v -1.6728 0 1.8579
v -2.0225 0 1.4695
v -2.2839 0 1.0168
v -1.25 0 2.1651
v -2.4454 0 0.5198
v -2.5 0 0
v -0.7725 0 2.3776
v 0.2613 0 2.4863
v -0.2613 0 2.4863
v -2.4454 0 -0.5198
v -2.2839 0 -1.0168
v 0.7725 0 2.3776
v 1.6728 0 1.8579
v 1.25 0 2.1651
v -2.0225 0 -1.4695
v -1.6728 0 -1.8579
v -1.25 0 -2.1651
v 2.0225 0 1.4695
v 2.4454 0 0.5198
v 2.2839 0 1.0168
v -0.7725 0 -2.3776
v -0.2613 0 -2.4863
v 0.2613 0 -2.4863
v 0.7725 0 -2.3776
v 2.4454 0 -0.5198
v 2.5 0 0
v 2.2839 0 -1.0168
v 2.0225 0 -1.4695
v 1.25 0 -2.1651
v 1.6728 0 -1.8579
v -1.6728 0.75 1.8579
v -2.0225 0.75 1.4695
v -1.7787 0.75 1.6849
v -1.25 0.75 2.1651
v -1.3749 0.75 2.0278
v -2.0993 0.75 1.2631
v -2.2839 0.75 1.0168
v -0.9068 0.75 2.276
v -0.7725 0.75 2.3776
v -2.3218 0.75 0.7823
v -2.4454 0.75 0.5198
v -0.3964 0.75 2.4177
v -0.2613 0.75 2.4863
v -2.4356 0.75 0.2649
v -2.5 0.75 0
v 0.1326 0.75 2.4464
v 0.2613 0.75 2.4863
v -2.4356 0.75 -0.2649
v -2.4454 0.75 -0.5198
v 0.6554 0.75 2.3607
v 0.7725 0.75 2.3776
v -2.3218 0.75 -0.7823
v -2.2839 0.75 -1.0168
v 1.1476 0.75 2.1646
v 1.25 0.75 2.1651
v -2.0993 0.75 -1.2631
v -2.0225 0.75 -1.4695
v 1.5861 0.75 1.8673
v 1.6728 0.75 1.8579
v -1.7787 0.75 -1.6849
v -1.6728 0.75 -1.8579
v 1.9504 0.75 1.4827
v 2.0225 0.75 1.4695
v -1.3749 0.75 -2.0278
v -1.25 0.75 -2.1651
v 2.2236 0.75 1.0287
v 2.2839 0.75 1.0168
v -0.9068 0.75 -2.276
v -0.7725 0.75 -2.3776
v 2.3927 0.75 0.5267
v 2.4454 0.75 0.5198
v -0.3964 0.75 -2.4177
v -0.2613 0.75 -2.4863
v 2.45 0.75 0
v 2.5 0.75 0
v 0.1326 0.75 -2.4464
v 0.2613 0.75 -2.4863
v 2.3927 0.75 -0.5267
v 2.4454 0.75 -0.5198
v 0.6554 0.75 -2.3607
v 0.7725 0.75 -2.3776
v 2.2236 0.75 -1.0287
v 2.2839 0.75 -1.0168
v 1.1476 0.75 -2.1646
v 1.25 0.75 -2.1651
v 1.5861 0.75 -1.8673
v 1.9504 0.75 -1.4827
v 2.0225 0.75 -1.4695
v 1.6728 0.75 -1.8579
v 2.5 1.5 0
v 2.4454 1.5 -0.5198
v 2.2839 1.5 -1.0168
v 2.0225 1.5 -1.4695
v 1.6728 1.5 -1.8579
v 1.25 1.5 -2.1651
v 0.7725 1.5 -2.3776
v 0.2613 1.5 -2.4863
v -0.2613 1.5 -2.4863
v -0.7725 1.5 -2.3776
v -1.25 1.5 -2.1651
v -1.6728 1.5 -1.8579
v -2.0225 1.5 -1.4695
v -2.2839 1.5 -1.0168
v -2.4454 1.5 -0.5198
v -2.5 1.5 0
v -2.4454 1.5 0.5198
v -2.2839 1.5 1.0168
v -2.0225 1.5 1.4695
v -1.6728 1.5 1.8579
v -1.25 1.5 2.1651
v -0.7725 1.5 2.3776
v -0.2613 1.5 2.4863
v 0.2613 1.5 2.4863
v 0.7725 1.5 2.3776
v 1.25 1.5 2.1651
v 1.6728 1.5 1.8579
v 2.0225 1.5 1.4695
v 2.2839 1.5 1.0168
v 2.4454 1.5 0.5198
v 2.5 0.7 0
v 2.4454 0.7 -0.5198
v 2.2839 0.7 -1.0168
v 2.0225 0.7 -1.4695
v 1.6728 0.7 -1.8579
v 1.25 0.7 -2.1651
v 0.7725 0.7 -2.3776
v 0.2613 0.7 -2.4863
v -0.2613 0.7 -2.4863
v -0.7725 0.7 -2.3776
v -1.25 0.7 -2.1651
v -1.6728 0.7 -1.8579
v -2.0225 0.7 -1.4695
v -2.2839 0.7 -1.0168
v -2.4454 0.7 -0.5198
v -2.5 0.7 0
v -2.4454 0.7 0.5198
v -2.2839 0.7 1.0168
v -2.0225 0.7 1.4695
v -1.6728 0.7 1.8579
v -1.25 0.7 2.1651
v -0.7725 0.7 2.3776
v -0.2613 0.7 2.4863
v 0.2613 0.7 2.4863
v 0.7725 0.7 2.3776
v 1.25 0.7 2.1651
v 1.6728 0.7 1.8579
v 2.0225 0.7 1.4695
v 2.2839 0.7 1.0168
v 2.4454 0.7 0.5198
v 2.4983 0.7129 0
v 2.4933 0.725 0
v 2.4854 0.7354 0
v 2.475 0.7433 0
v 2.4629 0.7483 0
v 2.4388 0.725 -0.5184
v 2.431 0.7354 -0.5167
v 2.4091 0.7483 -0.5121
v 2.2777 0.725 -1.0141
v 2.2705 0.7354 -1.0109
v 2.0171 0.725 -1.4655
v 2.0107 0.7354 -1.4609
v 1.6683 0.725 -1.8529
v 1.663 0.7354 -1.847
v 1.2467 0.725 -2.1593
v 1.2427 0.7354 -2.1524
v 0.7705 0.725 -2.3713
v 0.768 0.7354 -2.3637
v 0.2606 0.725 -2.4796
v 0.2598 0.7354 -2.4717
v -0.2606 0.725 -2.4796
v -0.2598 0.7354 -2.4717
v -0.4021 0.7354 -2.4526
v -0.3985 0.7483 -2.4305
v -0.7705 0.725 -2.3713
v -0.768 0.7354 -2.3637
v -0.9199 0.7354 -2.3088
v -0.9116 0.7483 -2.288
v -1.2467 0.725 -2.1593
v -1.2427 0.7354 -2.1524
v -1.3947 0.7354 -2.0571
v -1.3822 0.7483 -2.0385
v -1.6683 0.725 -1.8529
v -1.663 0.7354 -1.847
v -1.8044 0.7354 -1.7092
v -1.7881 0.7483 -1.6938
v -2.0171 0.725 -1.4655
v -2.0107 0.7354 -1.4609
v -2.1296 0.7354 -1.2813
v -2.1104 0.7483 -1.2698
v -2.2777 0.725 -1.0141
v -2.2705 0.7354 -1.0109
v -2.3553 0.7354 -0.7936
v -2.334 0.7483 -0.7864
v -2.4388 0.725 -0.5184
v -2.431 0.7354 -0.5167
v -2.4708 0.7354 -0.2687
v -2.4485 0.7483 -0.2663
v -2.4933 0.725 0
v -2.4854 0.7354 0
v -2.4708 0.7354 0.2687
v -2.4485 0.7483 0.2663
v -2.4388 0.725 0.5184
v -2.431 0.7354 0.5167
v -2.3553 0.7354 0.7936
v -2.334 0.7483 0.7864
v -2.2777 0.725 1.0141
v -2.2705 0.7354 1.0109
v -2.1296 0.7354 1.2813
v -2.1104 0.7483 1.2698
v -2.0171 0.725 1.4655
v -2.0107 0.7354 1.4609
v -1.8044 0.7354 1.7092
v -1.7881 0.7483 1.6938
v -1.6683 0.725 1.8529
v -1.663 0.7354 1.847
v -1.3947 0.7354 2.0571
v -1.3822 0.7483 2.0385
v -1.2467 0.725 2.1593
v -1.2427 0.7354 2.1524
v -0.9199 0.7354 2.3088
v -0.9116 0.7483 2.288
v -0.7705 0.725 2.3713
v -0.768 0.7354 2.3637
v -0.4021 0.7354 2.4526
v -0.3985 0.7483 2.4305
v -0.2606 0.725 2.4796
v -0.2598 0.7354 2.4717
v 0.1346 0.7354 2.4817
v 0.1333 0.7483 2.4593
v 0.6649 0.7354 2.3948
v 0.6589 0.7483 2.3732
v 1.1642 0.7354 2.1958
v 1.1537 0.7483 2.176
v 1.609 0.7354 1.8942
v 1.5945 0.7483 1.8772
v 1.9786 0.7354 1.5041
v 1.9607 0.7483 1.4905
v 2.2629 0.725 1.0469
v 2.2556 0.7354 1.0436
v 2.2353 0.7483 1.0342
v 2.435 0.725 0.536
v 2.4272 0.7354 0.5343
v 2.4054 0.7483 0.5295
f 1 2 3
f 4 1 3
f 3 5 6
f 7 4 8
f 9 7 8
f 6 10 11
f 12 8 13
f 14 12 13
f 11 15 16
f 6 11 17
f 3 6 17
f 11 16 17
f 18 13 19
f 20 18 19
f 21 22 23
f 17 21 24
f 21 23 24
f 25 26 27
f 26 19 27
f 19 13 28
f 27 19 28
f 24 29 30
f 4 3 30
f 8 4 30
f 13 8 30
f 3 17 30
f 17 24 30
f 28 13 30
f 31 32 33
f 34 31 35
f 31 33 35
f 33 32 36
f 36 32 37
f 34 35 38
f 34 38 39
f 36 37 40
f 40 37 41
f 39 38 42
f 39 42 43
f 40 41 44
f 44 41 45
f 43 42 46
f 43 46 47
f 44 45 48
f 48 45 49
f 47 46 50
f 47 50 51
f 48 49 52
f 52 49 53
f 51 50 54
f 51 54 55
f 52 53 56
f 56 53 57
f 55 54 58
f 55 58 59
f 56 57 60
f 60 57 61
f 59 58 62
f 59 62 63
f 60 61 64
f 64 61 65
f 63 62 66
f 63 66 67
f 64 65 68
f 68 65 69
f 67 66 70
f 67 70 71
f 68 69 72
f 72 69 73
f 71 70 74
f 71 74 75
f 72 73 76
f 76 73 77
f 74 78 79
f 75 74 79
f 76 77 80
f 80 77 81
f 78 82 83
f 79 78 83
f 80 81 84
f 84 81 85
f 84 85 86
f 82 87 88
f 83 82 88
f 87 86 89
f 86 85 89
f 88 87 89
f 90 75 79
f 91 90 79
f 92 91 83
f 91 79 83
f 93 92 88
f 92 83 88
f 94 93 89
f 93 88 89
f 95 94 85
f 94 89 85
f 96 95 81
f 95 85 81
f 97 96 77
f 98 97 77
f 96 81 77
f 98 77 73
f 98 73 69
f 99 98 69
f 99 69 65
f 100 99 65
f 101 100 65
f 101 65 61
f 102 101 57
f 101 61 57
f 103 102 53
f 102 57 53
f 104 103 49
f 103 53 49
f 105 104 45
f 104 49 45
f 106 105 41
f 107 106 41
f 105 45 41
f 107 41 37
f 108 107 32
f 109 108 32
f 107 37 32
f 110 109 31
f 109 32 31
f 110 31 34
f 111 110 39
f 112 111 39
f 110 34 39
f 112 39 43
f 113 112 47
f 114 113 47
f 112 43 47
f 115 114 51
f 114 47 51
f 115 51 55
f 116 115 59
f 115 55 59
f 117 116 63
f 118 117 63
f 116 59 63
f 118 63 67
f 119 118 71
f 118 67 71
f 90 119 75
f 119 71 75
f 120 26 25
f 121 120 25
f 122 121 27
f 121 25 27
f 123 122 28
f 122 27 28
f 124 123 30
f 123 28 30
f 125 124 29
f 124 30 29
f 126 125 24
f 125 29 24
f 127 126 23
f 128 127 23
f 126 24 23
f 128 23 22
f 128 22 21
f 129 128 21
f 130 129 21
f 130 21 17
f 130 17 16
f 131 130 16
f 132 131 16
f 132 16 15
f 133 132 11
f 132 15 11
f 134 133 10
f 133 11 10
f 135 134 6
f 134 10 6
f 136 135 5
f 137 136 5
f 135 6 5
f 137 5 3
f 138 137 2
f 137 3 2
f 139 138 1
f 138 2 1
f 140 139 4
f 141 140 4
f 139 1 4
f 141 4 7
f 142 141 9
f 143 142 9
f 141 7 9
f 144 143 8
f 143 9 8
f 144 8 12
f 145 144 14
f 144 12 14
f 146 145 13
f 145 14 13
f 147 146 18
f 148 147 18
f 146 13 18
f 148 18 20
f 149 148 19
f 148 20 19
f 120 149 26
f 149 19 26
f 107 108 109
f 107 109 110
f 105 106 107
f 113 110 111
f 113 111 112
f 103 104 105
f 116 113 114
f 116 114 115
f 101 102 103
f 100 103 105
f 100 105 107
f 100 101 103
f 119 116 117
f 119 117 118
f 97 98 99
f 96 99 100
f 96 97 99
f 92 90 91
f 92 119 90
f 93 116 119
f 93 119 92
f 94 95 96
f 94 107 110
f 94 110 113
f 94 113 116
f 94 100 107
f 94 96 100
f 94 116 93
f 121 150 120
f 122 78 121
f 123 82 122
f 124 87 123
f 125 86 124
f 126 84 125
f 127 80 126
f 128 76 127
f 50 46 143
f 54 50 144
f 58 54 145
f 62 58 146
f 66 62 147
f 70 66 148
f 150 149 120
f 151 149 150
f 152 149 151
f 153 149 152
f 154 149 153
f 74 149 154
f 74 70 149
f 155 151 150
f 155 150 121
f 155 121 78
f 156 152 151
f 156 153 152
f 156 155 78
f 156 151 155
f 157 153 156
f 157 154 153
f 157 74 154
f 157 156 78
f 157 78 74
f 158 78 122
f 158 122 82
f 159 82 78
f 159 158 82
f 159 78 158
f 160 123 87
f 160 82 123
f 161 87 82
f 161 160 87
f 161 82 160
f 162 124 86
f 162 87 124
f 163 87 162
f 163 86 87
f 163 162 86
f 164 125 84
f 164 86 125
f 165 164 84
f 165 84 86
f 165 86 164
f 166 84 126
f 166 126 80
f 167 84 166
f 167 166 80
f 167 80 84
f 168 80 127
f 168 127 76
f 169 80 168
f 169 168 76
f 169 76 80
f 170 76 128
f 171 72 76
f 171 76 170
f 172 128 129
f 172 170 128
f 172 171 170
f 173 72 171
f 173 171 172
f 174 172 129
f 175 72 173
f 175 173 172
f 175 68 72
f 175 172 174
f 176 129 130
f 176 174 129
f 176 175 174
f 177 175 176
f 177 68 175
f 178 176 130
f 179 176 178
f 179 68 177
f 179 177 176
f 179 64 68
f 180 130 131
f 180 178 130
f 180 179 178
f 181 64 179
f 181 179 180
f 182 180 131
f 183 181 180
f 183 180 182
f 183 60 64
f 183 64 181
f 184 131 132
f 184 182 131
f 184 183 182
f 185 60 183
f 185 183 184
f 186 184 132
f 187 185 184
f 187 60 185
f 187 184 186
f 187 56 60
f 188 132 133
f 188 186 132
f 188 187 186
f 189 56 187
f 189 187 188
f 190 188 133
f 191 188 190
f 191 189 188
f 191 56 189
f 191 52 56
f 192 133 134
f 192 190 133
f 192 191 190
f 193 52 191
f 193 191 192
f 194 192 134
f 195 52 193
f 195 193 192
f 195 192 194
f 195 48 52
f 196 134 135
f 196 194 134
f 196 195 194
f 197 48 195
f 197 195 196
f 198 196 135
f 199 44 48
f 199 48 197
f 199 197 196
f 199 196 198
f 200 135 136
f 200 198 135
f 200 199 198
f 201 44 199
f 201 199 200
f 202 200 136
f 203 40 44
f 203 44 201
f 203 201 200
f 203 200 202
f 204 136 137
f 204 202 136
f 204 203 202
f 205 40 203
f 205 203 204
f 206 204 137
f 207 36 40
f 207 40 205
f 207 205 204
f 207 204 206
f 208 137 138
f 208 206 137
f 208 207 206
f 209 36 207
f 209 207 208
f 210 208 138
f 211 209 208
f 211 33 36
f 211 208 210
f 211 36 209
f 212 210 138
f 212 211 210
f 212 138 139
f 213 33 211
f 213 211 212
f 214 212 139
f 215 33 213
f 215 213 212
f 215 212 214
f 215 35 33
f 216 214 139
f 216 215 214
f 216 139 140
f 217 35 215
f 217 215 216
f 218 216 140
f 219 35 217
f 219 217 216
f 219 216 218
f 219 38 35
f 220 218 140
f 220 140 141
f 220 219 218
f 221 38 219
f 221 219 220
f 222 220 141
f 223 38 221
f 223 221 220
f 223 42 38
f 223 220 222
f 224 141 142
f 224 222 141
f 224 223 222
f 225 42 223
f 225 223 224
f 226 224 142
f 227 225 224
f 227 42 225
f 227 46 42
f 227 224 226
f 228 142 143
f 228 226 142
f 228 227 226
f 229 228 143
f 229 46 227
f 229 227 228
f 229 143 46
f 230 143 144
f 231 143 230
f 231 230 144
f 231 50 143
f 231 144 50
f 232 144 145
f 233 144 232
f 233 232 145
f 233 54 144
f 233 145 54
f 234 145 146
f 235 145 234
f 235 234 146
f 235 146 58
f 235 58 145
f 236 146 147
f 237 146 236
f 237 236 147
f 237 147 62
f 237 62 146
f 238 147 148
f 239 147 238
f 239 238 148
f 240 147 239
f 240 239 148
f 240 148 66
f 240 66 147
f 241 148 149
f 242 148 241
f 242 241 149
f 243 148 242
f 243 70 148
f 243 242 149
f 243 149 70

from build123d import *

# Parameters (mm, degrees)
SKETCH1_R           = 2.5
BOSS_EXTRUDE1_DEPTH = 0.75
FILLET1_R           = 0.05
SKETCH2_R           = 2.5
BOSS_EXTRUDE2_DEPTH = 0.75


with BuildPart() as part:
    # Sketch1 → Boss-Extrude1 (new body)
    with BuildSketch(Plane(origin=(0, 0, 0), x_dir=(1, 0, 0), z_dir=(0, 1, 0))):
        Circle(SKETCH1_R)
    extrude(amount=BOSS_EXTRUDE1_DEPTH)

    # Fillet1
    fillet1_edges = [part.edges().sort_by_distance(p)[0] for p in [
        (-2.5, 0.75, 0),
    ]]
    fillet(fillet1_edges, radius=FILLET1_R)

    # Sketch2 → Boss-Extrude2 (add)
    with BuildSketch(Plane(origin=(0, 0.75, 0), x_dir=(1, 0, 0), z_dir=(0, 1, 0))):
        Circle(SKETCH2_R)
    extrude(amount=BOSS_EXTRUDE2_DEPTH)


solid = part.part
